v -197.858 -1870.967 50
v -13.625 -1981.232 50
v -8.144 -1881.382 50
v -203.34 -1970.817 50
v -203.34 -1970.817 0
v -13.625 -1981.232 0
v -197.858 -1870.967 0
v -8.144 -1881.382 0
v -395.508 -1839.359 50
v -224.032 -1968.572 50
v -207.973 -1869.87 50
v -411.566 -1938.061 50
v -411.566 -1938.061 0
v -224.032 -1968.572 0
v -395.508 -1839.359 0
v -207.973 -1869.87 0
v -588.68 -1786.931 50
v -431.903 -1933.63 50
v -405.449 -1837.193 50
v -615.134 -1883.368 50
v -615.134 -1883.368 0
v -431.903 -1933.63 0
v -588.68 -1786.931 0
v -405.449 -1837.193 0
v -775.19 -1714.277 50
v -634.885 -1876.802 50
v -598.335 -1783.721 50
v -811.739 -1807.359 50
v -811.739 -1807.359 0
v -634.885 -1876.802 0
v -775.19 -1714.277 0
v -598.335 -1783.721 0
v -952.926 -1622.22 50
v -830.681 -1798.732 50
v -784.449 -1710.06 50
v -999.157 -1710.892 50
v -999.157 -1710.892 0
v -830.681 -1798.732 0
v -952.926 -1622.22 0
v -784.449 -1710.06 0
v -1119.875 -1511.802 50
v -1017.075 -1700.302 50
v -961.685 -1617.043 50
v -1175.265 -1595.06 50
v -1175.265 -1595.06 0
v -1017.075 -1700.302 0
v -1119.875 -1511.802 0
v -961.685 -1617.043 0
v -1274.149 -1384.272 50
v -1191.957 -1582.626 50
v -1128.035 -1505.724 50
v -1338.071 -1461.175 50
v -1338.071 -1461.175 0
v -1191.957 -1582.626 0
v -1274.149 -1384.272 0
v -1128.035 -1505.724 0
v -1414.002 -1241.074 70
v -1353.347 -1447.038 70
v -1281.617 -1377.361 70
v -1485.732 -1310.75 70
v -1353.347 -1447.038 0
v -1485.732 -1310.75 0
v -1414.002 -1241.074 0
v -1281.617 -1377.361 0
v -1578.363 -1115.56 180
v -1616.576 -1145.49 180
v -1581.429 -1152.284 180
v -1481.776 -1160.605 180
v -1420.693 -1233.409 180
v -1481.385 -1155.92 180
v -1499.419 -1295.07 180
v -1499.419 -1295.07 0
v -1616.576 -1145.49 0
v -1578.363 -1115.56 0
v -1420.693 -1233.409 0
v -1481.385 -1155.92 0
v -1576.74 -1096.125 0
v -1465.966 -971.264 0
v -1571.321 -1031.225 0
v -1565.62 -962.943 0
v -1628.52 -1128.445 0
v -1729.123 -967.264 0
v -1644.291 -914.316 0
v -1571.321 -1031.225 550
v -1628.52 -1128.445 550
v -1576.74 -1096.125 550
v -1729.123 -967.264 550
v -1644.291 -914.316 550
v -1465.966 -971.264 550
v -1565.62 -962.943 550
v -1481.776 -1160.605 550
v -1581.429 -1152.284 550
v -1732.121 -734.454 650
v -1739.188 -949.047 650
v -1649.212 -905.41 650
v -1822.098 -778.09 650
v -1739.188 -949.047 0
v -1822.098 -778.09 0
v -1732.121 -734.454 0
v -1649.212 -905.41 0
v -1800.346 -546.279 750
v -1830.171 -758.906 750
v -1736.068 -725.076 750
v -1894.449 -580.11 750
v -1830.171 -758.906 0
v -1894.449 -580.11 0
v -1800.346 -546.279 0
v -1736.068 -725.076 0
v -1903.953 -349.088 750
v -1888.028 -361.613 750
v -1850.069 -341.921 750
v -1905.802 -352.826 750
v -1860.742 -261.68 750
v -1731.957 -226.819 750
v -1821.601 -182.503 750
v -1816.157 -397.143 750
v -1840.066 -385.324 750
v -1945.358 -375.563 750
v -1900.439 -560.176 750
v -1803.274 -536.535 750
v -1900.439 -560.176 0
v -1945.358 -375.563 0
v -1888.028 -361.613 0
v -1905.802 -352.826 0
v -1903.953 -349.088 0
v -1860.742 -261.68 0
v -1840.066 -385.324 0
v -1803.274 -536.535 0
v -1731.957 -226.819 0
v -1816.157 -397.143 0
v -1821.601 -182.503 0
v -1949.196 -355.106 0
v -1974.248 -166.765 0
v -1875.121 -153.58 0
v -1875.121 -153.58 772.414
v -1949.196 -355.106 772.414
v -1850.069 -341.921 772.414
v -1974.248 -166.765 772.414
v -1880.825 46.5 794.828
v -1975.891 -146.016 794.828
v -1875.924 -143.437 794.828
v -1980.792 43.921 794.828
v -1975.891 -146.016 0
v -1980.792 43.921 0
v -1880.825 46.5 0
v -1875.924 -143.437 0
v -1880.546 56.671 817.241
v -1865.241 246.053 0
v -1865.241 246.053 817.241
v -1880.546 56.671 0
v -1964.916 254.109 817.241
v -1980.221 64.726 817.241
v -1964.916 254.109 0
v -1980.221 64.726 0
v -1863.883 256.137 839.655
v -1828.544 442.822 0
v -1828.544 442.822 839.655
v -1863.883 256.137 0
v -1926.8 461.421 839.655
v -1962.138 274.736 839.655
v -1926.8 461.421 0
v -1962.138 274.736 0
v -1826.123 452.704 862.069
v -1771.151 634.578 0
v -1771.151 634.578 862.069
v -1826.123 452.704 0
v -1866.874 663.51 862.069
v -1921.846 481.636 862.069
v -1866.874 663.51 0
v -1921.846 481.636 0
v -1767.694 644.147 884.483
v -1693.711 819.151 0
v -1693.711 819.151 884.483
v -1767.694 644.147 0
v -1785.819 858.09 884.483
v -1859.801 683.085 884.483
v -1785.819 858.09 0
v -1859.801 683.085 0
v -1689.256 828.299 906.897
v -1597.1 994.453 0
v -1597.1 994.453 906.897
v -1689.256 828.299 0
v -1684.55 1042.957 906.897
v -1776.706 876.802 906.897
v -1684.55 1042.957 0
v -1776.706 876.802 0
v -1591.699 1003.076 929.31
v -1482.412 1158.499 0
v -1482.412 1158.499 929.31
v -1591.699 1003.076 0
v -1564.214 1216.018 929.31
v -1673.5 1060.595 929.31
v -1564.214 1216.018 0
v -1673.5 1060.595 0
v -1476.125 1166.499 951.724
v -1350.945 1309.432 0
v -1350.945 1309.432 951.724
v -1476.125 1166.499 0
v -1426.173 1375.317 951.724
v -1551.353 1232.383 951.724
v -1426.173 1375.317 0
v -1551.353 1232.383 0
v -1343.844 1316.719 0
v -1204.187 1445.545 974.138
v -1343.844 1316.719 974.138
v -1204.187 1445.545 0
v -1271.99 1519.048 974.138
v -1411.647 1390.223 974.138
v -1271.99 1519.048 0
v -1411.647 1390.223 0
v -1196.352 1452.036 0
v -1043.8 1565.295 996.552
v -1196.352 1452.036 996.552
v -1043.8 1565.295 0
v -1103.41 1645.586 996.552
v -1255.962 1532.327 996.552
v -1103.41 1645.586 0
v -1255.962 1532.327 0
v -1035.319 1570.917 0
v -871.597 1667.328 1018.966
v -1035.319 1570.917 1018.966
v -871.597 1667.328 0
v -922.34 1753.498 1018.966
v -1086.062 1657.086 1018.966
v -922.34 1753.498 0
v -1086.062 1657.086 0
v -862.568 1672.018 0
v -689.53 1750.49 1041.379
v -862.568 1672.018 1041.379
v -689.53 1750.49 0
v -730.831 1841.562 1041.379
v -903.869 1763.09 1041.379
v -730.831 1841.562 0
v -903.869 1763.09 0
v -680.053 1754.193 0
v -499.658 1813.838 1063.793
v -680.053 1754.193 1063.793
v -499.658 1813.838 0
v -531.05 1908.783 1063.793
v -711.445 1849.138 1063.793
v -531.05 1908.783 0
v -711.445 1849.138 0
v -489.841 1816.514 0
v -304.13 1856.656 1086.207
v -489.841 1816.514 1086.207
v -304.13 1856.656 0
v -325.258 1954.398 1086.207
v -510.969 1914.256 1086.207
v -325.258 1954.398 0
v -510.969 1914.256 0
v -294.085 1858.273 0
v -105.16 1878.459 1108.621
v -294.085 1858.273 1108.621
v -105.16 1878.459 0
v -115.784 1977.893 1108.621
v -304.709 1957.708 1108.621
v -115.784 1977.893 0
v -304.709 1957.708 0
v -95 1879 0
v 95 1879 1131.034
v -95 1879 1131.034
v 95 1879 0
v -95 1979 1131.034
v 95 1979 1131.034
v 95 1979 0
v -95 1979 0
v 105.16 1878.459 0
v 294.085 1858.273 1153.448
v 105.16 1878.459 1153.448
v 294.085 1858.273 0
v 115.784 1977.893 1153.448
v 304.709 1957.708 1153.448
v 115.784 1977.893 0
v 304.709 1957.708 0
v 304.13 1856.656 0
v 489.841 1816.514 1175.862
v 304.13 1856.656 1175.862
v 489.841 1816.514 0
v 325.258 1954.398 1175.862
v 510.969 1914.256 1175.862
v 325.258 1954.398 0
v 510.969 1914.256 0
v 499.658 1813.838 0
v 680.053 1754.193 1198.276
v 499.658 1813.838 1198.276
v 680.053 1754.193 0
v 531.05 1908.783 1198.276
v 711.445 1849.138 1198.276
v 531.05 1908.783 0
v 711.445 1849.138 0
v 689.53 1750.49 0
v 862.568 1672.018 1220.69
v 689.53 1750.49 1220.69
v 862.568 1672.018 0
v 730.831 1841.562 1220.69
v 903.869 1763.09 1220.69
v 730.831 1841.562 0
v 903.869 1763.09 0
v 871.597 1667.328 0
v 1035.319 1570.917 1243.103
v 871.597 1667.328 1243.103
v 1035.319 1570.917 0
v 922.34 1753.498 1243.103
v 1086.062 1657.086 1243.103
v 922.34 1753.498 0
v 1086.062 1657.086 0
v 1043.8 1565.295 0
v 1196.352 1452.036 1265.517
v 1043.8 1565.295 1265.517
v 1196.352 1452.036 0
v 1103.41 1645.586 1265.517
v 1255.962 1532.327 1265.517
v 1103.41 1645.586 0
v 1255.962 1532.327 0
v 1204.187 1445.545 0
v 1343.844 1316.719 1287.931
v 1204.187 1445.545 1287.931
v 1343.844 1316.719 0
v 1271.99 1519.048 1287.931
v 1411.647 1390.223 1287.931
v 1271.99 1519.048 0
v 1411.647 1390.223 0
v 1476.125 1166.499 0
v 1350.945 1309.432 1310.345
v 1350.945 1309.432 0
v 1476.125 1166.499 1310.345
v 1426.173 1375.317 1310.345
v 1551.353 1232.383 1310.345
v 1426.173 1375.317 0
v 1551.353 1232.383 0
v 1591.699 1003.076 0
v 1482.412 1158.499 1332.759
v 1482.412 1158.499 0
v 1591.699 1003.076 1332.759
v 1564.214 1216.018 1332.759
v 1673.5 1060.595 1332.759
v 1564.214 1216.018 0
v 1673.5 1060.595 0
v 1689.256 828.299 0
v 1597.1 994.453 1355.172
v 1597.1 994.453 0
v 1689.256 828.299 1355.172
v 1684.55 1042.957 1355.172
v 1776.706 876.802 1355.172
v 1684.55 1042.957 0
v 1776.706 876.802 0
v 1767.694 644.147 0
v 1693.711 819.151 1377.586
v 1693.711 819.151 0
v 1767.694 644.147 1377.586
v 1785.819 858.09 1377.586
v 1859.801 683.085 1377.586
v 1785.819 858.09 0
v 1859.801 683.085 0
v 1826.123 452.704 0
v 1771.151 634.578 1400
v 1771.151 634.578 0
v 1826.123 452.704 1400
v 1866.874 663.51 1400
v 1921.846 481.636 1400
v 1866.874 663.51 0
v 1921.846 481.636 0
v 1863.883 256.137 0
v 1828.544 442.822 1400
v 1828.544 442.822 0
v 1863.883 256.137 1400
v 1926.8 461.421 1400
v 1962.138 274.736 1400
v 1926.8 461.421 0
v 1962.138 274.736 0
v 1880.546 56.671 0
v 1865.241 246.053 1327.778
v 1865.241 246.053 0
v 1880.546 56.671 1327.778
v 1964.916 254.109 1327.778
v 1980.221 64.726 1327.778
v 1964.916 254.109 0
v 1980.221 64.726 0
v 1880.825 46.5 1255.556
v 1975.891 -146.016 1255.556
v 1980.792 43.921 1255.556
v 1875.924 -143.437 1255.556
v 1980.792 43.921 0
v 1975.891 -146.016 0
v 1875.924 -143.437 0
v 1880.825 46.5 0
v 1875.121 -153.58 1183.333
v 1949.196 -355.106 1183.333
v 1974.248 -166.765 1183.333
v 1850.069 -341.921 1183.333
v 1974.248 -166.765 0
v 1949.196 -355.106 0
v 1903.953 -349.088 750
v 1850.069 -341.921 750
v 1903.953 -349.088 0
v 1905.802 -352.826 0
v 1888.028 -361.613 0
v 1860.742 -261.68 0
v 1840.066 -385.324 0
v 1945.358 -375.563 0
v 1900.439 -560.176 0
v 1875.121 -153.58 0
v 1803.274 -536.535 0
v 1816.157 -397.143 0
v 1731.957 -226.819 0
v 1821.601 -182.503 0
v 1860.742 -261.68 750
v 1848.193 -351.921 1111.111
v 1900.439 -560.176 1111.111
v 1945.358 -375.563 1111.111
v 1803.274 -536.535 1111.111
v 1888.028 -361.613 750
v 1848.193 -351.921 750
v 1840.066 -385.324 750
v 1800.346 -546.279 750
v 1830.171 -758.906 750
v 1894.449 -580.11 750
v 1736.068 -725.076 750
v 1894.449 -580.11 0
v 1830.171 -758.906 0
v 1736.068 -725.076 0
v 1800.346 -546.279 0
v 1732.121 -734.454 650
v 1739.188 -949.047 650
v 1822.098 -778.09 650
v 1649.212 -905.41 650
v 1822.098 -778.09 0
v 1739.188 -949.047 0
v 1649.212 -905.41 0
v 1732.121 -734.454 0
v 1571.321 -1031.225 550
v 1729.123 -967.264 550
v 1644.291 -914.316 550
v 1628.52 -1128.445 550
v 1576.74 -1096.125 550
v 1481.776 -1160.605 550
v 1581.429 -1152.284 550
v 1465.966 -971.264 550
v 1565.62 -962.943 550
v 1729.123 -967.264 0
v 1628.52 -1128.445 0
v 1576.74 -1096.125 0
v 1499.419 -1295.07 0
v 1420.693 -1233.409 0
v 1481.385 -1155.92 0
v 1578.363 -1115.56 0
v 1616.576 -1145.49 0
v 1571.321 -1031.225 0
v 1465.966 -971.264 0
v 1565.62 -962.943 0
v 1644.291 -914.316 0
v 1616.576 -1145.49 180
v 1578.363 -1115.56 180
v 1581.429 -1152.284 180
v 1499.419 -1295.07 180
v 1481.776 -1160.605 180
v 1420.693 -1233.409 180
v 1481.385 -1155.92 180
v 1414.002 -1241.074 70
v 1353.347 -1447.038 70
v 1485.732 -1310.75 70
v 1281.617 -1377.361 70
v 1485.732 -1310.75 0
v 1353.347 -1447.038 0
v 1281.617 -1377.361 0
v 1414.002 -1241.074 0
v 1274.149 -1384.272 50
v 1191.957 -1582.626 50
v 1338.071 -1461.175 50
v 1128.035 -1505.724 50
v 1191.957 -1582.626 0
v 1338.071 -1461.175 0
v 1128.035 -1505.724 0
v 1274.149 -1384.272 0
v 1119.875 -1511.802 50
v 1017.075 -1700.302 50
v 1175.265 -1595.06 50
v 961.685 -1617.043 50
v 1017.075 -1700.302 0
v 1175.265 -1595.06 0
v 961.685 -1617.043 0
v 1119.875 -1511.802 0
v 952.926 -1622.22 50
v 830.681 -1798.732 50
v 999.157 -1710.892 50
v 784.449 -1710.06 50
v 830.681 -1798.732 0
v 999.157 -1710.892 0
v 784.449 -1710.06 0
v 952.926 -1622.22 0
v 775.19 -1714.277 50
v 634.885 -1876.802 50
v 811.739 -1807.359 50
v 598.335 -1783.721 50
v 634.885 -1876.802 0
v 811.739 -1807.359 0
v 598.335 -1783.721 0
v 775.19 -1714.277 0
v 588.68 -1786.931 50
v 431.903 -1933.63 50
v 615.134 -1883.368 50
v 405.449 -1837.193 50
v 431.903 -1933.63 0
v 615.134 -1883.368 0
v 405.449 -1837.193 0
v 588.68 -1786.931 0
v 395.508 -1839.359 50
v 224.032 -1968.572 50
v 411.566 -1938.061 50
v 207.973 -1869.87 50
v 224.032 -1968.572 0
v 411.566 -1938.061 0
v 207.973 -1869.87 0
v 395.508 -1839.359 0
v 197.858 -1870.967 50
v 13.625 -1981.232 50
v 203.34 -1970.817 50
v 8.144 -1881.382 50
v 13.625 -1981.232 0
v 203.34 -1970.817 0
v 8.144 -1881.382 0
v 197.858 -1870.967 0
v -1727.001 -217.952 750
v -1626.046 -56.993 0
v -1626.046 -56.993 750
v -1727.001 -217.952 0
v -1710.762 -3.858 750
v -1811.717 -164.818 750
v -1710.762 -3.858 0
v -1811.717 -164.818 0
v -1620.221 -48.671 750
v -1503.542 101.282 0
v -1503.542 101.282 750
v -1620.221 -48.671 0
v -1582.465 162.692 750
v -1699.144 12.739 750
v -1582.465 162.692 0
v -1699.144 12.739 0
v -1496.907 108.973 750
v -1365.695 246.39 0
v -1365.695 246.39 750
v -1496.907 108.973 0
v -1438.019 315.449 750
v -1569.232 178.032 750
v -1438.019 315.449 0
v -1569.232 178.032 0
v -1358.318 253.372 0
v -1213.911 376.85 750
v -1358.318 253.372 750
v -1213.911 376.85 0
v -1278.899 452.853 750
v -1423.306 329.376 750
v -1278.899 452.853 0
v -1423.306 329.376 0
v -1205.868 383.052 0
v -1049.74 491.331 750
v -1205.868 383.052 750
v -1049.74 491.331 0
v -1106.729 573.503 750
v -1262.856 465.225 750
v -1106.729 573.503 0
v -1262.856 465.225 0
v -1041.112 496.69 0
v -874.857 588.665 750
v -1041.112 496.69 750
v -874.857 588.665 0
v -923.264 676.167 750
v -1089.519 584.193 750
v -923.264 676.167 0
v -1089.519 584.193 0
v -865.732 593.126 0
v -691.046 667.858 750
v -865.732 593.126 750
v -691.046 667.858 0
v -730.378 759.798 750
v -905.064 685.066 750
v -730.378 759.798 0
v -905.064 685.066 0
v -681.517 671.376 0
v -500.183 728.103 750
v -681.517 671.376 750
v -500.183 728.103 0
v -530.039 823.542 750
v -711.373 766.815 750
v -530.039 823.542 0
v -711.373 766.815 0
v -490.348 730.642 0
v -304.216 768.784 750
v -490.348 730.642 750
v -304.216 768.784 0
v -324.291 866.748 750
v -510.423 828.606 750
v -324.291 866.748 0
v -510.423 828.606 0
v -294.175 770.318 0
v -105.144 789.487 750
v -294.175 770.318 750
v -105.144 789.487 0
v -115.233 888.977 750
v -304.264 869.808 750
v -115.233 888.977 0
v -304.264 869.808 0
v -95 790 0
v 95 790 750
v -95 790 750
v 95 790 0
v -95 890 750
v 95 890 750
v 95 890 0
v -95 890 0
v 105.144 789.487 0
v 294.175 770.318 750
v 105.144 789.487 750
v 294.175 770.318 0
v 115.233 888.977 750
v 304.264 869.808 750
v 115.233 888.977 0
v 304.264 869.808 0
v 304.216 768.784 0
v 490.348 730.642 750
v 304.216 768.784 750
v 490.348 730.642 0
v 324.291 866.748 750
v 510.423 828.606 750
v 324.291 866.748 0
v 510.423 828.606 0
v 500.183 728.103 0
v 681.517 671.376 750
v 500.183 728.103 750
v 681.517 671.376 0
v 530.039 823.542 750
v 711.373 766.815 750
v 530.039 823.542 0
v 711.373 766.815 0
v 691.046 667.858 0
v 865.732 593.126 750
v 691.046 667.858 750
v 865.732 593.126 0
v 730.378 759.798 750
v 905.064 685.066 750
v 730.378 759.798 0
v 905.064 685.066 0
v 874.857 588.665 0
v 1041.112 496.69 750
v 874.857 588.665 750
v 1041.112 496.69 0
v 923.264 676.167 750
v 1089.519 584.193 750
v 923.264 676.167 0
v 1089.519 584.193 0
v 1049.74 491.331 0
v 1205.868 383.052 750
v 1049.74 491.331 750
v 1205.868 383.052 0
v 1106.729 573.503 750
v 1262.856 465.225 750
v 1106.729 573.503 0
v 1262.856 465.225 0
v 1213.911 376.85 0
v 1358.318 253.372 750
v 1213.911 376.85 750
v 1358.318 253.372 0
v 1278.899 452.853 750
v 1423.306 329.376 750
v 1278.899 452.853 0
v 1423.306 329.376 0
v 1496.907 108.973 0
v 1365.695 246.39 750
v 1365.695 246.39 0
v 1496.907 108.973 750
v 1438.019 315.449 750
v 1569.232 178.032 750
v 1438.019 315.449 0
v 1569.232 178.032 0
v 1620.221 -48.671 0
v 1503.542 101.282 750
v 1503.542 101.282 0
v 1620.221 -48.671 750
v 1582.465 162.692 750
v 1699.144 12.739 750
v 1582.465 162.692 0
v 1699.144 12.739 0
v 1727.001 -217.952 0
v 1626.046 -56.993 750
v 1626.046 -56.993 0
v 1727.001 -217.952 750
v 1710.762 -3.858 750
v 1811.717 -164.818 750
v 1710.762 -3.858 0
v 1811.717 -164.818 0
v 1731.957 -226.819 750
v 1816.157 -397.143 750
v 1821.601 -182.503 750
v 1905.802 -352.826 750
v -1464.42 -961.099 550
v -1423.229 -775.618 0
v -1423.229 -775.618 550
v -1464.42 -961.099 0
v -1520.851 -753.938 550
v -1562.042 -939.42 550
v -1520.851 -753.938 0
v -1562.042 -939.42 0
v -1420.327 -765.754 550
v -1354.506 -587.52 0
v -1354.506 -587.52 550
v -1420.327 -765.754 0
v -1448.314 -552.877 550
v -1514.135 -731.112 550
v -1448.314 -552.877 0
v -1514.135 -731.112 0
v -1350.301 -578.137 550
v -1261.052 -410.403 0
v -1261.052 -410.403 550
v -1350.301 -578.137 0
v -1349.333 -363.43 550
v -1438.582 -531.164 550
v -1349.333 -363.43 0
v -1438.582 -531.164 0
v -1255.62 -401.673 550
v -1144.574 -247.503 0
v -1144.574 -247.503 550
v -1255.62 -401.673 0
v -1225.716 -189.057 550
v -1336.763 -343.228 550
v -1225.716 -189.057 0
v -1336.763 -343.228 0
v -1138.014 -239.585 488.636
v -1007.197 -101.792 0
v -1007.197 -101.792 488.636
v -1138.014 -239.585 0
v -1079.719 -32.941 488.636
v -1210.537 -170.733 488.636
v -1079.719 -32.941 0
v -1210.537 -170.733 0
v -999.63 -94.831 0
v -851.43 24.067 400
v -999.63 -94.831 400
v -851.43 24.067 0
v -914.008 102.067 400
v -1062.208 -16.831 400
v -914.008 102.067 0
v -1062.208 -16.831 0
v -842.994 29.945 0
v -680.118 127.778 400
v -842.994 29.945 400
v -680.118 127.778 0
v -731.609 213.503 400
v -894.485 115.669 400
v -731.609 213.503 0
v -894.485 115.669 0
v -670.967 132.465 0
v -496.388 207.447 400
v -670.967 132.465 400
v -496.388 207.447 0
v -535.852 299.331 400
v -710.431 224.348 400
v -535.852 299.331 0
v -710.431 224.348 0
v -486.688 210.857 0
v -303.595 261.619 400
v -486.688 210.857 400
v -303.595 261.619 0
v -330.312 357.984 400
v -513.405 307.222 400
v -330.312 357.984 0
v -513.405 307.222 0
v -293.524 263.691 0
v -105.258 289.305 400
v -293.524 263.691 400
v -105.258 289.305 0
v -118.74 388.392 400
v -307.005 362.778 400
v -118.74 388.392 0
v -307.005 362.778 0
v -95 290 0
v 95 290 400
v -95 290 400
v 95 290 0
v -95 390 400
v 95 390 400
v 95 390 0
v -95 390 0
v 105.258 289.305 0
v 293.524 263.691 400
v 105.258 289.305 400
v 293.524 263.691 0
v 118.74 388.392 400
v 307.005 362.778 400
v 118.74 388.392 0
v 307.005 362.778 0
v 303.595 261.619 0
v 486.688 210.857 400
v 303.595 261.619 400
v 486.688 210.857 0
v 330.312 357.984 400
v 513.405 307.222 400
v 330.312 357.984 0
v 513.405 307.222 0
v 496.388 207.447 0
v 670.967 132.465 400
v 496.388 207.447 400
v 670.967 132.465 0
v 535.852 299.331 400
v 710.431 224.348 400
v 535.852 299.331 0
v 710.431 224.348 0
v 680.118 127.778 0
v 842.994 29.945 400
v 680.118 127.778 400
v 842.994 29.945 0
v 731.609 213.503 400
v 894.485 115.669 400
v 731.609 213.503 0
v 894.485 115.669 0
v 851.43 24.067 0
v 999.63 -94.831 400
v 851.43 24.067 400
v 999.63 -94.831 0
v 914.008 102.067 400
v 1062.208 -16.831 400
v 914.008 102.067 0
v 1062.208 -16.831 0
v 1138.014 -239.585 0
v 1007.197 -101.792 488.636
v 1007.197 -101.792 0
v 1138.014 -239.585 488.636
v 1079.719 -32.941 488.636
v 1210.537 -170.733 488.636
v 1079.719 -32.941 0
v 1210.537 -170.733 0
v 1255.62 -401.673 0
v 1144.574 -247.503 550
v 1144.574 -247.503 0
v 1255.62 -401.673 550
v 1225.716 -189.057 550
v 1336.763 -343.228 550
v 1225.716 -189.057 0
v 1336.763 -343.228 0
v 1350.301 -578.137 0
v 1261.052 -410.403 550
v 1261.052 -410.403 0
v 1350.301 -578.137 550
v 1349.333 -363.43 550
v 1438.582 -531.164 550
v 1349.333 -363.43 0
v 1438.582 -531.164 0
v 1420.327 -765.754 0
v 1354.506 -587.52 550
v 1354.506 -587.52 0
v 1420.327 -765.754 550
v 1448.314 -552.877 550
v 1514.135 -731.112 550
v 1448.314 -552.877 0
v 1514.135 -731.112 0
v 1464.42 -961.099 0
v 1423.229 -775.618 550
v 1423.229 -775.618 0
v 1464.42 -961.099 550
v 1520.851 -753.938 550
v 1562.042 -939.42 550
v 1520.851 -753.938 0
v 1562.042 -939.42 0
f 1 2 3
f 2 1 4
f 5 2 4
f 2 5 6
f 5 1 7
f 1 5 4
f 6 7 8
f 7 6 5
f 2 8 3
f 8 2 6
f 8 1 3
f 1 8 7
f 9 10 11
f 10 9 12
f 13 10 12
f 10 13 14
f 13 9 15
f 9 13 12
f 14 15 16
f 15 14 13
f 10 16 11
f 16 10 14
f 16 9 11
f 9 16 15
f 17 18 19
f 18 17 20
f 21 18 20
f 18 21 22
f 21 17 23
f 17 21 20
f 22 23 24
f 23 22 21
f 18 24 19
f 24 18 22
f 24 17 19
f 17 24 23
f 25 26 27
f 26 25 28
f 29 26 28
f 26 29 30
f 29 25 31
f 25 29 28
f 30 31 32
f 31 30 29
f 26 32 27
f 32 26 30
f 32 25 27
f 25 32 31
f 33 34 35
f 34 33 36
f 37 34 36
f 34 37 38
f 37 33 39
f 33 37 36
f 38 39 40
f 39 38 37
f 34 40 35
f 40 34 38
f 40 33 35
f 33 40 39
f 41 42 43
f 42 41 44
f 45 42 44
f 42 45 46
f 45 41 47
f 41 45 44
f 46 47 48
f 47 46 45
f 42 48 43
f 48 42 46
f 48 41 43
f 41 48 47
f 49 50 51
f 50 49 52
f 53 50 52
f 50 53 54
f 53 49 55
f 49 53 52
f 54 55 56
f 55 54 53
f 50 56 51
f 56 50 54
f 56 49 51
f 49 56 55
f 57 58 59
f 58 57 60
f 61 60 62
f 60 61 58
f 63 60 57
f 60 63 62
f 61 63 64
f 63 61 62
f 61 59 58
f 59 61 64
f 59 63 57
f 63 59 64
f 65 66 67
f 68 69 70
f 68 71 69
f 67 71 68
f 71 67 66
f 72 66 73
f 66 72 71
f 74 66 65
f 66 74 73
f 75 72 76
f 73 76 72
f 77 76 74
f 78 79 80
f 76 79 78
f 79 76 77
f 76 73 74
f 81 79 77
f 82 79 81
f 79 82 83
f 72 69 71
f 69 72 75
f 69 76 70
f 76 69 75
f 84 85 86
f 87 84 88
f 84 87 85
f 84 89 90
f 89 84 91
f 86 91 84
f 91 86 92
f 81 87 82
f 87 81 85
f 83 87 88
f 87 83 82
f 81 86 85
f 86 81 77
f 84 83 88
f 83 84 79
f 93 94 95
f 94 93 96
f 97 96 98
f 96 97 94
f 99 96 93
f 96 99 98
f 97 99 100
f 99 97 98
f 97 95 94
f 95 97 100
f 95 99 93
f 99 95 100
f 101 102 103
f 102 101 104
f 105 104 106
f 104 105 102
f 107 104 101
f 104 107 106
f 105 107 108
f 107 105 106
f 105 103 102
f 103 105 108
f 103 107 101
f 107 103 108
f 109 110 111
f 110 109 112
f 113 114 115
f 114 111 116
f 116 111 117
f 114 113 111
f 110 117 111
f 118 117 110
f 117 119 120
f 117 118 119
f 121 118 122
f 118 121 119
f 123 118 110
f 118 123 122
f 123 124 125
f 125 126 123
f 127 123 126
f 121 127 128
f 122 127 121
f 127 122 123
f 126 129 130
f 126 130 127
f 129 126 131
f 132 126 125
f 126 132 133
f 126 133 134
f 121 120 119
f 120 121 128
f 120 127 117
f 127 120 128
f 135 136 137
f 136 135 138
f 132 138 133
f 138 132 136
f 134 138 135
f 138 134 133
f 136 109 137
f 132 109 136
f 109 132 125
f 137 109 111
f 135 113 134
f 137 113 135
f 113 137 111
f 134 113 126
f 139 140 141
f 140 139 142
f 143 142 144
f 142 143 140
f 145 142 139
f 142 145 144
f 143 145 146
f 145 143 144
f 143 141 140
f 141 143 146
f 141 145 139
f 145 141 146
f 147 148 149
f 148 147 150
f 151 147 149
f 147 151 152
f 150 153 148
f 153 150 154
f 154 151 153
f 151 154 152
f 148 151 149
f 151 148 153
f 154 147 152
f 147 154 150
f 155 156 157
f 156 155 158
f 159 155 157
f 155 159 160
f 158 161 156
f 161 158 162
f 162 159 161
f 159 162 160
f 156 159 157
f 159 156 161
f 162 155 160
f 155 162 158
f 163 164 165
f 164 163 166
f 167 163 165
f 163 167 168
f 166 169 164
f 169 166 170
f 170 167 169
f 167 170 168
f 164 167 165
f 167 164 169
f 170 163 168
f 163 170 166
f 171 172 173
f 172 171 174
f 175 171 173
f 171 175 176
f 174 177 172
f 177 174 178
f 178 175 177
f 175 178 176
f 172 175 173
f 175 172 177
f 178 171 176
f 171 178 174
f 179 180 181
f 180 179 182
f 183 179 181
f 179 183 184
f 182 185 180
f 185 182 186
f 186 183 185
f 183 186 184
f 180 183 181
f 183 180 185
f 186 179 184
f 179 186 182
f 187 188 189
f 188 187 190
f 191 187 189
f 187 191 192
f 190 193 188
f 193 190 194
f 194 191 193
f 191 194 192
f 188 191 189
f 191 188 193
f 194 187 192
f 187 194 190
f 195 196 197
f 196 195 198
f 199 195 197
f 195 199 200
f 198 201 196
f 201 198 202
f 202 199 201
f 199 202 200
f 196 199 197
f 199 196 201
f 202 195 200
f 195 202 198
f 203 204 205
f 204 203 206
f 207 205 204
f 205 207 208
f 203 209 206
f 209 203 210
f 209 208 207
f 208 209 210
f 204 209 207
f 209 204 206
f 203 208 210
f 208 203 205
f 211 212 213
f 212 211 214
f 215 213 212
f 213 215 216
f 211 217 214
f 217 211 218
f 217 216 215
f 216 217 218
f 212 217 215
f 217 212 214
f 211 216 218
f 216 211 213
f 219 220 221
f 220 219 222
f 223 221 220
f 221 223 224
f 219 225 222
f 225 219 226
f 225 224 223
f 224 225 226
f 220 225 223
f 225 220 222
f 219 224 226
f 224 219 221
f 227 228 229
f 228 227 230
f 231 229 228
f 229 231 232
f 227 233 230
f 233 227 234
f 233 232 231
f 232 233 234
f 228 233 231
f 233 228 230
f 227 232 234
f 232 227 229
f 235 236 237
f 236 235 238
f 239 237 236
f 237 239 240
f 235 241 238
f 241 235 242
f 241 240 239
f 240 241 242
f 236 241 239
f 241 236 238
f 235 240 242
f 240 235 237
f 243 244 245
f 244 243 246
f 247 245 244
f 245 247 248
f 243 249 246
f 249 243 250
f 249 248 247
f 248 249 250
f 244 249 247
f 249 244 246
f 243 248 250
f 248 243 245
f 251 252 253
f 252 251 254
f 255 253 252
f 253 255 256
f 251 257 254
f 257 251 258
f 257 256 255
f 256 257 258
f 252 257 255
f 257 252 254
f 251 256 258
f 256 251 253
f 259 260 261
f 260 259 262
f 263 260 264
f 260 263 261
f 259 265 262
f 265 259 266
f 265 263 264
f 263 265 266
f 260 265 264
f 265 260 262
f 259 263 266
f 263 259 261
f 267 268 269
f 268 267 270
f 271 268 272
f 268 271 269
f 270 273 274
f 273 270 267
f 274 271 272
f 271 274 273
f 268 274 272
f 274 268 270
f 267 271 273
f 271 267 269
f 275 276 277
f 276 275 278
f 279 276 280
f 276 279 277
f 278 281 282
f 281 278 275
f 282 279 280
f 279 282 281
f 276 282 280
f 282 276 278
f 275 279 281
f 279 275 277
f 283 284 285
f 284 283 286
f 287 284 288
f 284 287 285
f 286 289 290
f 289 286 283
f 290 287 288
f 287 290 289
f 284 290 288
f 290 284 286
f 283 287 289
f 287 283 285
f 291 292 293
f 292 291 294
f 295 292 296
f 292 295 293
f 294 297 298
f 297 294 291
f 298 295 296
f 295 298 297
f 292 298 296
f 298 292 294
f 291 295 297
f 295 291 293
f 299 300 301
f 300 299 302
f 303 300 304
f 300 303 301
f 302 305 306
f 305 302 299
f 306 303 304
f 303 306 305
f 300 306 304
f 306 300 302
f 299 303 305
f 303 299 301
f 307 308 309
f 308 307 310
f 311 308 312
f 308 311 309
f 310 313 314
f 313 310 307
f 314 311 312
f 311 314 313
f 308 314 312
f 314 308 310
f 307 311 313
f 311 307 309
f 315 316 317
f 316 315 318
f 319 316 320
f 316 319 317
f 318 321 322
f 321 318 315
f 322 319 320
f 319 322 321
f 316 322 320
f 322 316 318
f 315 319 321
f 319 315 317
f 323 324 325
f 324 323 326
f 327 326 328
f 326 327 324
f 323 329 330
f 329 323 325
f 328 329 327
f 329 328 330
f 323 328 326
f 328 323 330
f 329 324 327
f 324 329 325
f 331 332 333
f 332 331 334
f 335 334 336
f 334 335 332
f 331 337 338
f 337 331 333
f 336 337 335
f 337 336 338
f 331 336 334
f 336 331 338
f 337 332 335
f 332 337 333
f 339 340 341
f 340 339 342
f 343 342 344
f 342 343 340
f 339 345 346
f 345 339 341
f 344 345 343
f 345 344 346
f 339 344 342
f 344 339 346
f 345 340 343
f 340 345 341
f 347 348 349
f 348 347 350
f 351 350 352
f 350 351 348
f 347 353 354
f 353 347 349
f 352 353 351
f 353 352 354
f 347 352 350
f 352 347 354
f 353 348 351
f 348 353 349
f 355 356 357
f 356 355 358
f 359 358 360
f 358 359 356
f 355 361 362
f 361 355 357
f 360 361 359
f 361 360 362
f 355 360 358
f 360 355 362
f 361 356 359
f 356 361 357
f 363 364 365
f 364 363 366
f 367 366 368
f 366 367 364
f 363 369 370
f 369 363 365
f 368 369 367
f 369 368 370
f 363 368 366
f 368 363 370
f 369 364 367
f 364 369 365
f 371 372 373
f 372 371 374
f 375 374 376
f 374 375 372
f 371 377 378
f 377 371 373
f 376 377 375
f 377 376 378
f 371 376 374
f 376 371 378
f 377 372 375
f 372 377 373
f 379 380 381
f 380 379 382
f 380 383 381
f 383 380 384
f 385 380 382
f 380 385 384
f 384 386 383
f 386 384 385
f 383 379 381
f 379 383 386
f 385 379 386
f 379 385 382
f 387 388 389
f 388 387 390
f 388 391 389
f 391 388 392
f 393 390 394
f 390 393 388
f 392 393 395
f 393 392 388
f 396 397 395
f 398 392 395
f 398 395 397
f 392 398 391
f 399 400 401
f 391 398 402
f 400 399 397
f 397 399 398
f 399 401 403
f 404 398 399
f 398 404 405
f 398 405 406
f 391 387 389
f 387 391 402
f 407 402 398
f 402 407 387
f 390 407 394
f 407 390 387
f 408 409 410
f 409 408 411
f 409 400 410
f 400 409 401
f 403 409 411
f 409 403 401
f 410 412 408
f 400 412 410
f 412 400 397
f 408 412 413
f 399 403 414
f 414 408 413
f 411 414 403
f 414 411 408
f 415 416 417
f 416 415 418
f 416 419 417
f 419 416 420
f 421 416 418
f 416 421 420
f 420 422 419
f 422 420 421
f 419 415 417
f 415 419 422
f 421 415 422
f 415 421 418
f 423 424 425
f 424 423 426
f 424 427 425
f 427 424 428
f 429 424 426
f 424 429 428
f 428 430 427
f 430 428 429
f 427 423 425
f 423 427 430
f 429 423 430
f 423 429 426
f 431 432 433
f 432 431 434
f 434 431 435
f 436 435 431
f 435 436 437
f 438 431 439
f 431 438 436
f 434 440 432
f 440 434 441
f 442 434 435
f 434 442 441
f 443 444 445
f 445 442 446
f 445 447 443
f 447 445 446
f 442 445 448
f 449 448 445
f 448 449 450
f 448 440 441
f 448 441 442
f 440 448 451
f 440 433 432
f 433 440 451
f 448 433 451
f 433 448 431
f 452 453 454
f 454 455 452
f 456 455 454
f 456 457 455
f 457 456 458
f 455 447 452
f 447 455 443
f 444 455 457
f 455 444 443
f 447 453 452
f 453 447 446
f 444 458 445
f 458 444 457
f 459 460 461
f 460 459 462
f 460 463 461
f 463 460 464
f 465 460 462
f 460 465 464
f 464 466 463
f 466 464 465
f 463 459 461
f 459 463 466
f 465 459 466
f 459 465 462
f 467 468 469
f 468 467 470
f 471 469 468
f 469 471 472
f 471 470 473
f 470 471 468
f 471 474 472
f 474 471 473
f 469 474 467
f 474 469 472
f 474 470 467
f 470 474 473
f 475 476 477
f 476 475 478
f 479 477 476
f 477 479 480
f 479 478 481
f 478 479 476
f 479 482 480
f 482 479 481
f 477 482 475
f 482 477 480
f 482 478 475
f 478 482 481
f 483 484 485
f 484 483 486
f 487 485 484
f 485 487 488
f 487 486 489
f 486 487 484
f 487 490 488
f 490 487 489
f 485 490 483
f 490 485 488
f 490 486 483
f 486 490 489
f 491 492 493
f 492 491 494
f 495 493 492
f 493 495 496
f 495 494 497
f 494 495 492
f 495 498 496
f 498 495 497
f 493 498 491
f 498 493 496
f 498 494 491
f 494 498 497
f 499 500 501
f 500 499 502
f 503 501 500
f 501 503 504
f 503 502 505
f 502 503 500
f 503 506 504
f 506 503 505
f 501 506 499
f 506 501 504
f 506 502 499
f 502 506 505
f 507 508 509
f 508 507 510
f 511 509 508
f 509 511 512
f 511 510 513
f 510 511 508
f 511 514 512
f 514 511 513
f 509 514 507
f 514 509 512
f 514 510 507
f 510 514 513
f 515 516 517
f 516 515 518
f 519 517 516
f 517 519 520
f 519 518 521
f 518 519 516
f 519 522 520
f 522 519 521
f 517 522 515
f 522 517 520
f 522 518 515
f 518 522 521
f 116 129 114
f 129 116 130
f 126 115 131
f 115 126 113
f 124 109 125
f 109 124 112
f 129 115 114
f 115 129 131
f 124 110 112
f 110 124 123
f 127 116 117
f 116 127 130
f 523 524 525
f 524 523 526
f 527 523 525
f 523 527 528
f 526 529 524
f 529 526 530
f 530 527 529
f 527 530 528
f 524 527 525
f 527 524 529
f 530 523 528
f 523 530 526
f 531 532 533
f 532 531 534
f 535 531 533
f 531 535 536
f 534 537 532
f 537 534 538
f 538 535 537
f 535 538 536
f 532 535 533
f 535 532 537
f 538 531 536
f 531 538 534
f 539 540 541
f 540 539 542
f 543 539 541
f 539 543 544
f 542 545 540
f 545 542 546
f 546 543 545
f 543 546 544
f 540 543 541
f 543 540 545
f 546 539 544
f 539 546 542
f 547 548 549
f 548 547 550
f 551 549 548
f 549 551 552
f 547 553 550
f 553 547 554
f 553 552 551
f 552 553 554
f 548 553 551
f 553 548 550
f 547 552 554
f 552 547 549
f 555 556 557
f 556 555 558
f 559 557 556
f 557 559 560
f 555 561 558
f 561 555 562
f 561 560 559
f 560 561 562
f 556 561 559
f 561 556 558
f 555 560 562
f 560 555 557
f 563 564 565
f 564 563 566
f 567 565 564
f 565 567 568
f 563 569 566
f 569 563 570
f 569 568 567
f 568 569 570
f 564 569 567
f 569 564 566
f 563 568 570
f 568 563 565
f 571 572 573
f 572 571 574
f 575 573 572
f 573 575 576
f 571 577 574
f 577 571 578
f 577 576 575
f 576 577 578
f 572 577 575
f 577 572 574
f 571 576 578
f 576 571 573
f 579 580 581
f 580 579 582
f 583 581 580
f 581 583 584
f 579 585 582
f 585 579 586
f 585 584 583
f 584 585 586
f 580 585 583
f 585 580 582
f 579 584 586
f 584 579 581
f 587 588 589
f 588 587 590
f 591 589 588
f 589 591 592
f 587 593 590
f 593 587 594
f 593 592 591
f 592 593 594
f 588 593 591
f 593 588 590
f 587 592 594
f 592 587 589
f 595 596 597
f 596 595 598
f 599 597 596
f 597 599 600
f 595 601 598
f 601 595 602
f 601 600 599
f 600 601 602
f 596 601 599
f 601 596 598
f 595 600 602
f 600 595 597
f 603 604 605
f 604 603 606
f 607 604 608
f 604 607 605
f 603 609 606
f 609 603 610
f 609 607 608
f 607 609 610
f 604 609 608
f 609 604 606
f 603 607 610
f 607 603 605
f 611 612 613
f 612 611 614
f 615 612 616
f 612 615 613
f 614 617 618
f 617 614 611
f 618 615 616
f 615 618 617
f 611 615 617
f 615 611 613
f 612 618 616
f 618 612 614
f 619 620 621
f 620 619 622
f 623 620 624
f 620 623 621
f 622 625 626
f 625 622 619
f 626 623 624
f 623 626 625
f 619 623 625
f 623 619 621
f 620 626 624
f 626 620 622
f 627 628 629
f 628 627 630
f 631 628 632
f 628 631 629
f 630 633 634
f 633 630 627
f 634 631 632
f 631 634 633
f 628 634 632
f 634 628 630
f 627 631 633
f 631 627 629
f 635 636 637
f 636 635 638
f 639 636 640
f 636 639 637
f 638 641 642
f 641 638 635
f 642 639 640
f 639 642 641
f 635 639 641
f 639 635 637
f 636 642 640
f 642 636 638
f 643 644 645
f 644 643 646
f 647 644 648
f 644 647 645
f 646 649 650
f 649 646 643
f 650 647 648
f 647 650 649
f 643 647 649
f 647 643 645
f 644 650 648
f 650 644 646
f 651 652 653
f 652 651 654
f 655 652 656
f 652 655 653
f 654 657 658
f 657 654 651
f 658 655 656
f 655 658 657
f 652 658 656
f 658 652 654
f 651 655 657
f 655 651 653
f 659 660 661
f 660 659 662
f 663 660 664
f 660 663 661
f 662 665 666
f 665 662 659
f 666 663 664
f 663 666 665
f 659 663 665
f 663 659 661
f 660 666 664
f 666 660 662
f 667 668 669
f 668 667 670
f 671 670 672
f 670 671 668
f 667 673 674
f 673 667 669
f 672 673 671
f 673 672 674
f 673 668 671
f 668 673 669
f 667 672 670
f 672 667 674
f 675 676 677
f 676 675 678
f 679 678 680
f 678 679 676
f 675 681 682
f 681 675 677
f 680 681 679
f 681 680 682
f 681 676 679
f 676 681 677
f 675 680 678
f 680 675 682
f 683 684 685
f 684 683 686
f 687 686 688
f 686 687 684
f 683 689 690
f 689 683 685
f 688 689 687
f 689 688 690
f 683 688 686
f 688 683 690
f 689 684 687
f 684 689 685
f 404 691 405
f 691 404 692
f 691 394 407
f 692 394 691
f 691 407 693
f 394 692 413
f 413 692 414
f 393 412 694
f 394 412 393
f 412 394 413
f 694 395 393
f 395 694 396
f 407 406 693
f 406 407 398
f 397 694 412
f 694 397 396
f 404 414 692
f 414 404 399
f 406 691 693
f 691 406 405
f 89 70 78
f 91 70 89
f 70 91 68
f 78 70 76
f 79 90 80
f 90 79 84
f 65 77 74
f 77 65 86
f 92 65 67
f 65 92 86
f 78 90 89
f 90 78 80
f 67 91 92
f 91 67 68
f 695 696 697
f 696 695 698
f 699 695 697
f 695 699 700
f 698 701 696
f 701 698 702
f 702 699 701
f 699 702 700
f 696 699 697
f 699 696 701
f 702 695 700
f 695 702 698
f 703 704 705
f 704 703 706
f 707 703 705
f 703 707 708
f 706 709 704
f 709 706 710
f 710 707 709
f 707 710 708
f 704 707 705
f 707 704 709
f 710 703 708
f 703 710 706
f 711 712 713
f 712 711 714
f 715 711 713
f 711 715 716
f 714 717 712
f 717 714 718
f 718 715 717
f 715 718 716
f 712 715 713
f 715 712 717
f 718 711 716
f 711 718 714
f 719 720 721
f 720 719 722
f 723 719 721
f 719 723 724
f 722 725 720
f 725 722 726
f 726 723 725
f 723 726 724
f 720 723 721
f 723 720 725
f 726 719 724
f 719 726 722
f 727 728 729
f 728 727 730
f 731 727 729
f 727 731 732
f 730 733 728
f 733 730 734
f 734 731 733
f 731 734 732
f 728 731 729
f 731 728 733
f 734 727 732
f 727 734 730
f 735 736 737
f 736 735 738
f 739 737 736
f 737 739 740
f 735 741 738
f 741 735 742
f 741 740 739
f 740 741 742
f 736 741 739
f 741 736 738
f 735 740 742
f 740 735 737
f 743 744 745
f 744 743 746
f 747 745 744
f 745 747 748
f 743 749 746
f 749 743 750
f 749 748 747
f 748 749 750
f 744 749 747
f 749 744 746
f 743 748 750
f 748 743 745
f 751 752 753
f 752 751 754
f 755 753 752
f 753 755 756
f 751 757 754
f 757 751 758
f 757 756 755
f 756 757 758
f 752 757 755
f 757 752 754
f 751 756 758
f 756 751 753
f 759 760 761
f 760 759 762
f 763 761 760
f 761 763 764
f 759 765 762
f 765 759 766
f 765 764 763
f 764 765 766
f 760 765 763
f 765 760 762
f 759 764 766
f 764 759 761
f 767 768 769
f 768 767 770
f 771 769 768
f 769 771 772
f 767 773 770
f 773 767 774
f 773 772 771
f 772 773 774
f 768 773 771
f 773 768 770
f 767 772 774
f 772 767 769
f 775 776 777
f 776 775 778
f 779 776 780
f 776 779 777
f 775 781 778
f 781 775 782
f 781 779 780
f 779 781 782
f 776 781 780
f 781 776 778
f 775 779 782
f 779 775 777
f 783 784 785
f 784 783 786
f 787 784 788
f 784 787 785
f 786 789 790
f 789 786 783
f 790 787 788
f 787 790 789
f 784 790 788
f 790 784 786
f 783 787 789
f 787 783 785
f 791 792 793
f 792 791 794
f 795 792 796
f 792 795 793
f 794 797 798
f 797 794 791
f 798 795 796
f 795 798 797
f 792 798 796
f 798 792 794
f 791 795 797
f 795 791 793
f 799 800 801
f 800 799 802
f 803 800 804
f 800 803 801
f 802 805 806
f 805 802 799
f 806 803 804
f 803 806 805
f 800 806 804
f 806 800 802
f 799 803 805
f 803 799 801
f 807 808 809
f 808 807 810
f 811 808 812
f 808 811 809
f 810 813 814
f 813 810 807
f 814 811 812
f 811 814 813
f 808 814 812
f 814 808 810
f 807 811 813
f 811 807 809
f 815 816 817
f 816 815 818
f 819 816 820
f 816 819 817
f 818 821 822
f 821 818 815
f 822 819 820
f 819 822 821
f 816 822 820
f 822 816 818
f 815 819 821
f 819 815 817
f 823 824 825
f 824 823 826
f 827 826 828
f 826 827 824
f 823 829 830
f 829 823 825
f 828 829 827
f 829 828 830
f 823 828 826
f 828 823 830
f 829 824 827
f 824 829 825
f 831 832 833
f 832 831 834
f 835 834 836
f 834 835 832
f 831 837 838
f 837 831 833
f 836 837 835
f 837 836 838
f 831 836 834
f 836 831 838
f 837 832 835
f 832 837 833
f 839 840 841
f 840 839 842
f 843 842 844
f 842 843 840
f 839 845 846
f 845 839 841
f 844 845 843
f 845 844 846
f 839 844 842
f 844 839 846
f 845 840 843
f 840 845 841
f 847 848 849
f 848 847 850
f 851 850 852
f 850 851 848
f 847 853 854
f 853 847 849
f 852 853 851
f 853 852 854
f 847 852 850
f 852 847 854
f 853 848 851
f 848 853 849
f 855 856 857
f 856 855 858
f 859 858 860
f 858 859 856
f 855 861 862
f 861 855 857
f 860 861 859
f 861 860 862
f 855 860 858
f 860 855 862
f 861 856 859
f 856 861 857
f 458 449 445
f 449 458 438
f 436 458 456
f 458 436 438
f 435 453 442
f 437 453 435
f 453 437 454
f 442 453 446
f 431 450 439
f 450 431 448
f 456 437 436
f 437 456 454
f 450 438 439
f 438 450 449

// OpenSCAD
function ai_idx_float(array, idx, max_idx) = (len(array)-1)*idx/(max_idx-1);
function ai_low_idx(array, idx, max_idx) = (floor(ai_idx_float(array, idx, max_idx)) >= len(array)-1) ? floor(ai_idx_float(array, idx, max_idx))-1 : floor(ai_idx_float(array, idx, max_idx));
function ai_a(array, idx, max_idx) = ai_idx_float(array, idx, max_idx) - ai_low_idx(array, idx, max_idx);
function ai_low(array, idx, max_idx) = array[ai_low_idx(array, idx, max_idx)];
function ai_high(array, idx, max_idx) = array[ai_low_idx(array, idx, max_idx)+1];

function array_interpolate(array, index, max_index) = 
(1-ai_a(array, index, max_index))*ai_low(array, index, max_index) + ai_a(array, index, max_index)*ai_high(array, index, max_index);
 
module circularWall(radius, width, depth, height_array, start_angle=0, end_angle=360) {
    number_of_elements_float = 2*PI*(radius-depth/2)*(end_angle-start_angle) / (360*width);
    number_of_elements = floor(number_of_elements_float);
    echo("Number of elements: ", number_of_elements);
    // what is the real angle the integer number of elements will cover
    real_total_angle=(end_angle - start_angle) * number_of_elements / number_of_elements_float;
    real_start_angle=(start_angle+end_angle-real_total_angle)/2;
    real_end_angle=(start_angle+end_angle+real_total_angle)/2;
    for (i = [0:number_of_elements-1]) {
        fi=real_total_angle*(i+0.5)/number_of_elements+real_start_angle;
        height=array_interpolate(height_array, i, number_of_elements);
        translate([-radius*cos(fi), radius*sin(fi), height/2]) {
            rotate([0, 0, -fi]) {
                cube([depth,width*0.95,height], center=true);
            }
        }
    }
}

module cutCircularWall(radius, cut_radius, radius, width, depth, height_array, cut_displacement) {
    cut_y=-(-cut_radius*cut_radius + radius*radius + cut_displacement*cut_displacement)/(2*cut_displacement);
    cut_x=sqrt(radius*radius - cut_y*cut_y);
    half_cut_angle=asin(cut_x/cut_radius);

    translate([0,-cut_displacement,0]) {
        circularWall(cut_radius, width, depth, height_array, 90-half_cut_angle, 90+half_cut_angle);
    }
}

module benchWall(width, depth, height_array, radius, y_displacement, half_angle) {
    translate([-radius*sin(half_angle),-y_displacement+radius*cos(half_angle),0]) {
        rotate([0,0,half_angle]) {
            translate([0,width,0]) {
                h = height_array[0];
                translate([0,0,h/2]) {
                cube([depth,width*1.0,height_array[0]], center=true);
                }
                h2 = height_array[len(height_array)-1];

                translate([0,-width,h2/2]) {
                    cube([depth,width*1.0,h2], center=true);
                }
            }
        }
    }
}

radius=3850/2+4;
width=200;
depth=100;
bench_width=width*2+depth;
cut_radius=radius+bench_width-400;
cut_displacement=cut_radius-800-40;
bench_wall_angle=50.75;

function _multi_array_interpolation(multi_array, current_multi_array_index, desired_index) =
    (desired_index < multi_array[current_multi_array_index][2]) ?
        array_interpolate([multi_array[current_multi_array_index][0], multi_array[current_multi_array_index][1]], desired_index, multi_array[current_multi_array_index][2]) : 
        _multi_array_interpolation(multi_array, current_multi_array_index+1, desired_index-multi_array[current_multi_array_index][2]);
    
function multi_array_interpolation(multi_array, index) =
    _multi_array_interpolation(multi_array, 0, index);
   
/* 35 */
back_wall_multi_array=[
    [750, 1400, 30],
    [1400, 750, 10]
];

function back_wall_interpolation(index) =
    multi_array_interpolation(back_wall_multi_array, index);


height_array=[50, 50, 50, 50, 50, 50, 50, 70, 180, /* left of low font */
              550, 650, 750, /* left bench planter */
    back_wall_interpolation(0),
    back_wall_interpolation(1),
    back_wall_interpolation(2),
    back_wall_interpolation(3),
    back_wall_interpolation(4),
    back_wall_interpolation(5),
    back_wall_interpolation(6),
    back_wall_interpolation(7),
    back_wall_interpolation(8),
    back_wall_interpolation(9),
    back_wall_interpolation(10),
    back_wall_interpolation(11),
    back_wall_interpolation(12),
    back_wall_interpolation(13),
    back_wall_interpolation(14),
    back_wall_interpolation(15),
    back_wall_interpolation(16),
    back_wall_interpolation(17),
    back_wall_interpolation(18),
    back_wall_interpolation(19),
    back_wall_interpolation(20),
    back_wall_interpolation(21),
    back_wall_interpolation(22),
    back_wall_interpolation(23),
    back_wall_interpolation(24),
    back_wall_interpolation(25),
    back_wall_interpolation(26),
    back_wall_interpolation(27),
    back_wall_interpolation(28),
    back_wall_interpolation(29),
    back_wall_interpolation(30),
    back_wall_interpolation(31),
    back_wall_interpolation(32),
    back_wall_interpolation(33),
    back_wall_interpolation(34),
              750, 650, 550, /* right bench planter */
              180, 70, 50, 50, 50, 50, 50, 50, 50]; /* right of low front */
circularWall(radius, width, depth, height_array ,-90, 270);
cutCircularWall(radius, cut_radius, radius, width, depth, [750,750], cut_displacement);
front_wall_height_array=[550, 550, 550, 550,
                         400, 400, 400, 400,
                         400, 400, 400, 400,
                         550, 550, 550, 550];
                         echo("inner wall radius: ", cut_radius-bench_width);
cutCircularWall(radius, cut_radius-bench_width, radius, width, depth, front_wall_height_array, cut_displacement);
bench_height_array=[550,550];
//benchWall(width, depth, bench_height_array, cut_radius-bench_width+width/2+depth/2, cut_displacement, bench_wall_angle);
//benchWall(width, depth, bench_height_array, cut_radius-bench_width+width/2+depth/2, cut_displacement, -bench_wall_angle);
